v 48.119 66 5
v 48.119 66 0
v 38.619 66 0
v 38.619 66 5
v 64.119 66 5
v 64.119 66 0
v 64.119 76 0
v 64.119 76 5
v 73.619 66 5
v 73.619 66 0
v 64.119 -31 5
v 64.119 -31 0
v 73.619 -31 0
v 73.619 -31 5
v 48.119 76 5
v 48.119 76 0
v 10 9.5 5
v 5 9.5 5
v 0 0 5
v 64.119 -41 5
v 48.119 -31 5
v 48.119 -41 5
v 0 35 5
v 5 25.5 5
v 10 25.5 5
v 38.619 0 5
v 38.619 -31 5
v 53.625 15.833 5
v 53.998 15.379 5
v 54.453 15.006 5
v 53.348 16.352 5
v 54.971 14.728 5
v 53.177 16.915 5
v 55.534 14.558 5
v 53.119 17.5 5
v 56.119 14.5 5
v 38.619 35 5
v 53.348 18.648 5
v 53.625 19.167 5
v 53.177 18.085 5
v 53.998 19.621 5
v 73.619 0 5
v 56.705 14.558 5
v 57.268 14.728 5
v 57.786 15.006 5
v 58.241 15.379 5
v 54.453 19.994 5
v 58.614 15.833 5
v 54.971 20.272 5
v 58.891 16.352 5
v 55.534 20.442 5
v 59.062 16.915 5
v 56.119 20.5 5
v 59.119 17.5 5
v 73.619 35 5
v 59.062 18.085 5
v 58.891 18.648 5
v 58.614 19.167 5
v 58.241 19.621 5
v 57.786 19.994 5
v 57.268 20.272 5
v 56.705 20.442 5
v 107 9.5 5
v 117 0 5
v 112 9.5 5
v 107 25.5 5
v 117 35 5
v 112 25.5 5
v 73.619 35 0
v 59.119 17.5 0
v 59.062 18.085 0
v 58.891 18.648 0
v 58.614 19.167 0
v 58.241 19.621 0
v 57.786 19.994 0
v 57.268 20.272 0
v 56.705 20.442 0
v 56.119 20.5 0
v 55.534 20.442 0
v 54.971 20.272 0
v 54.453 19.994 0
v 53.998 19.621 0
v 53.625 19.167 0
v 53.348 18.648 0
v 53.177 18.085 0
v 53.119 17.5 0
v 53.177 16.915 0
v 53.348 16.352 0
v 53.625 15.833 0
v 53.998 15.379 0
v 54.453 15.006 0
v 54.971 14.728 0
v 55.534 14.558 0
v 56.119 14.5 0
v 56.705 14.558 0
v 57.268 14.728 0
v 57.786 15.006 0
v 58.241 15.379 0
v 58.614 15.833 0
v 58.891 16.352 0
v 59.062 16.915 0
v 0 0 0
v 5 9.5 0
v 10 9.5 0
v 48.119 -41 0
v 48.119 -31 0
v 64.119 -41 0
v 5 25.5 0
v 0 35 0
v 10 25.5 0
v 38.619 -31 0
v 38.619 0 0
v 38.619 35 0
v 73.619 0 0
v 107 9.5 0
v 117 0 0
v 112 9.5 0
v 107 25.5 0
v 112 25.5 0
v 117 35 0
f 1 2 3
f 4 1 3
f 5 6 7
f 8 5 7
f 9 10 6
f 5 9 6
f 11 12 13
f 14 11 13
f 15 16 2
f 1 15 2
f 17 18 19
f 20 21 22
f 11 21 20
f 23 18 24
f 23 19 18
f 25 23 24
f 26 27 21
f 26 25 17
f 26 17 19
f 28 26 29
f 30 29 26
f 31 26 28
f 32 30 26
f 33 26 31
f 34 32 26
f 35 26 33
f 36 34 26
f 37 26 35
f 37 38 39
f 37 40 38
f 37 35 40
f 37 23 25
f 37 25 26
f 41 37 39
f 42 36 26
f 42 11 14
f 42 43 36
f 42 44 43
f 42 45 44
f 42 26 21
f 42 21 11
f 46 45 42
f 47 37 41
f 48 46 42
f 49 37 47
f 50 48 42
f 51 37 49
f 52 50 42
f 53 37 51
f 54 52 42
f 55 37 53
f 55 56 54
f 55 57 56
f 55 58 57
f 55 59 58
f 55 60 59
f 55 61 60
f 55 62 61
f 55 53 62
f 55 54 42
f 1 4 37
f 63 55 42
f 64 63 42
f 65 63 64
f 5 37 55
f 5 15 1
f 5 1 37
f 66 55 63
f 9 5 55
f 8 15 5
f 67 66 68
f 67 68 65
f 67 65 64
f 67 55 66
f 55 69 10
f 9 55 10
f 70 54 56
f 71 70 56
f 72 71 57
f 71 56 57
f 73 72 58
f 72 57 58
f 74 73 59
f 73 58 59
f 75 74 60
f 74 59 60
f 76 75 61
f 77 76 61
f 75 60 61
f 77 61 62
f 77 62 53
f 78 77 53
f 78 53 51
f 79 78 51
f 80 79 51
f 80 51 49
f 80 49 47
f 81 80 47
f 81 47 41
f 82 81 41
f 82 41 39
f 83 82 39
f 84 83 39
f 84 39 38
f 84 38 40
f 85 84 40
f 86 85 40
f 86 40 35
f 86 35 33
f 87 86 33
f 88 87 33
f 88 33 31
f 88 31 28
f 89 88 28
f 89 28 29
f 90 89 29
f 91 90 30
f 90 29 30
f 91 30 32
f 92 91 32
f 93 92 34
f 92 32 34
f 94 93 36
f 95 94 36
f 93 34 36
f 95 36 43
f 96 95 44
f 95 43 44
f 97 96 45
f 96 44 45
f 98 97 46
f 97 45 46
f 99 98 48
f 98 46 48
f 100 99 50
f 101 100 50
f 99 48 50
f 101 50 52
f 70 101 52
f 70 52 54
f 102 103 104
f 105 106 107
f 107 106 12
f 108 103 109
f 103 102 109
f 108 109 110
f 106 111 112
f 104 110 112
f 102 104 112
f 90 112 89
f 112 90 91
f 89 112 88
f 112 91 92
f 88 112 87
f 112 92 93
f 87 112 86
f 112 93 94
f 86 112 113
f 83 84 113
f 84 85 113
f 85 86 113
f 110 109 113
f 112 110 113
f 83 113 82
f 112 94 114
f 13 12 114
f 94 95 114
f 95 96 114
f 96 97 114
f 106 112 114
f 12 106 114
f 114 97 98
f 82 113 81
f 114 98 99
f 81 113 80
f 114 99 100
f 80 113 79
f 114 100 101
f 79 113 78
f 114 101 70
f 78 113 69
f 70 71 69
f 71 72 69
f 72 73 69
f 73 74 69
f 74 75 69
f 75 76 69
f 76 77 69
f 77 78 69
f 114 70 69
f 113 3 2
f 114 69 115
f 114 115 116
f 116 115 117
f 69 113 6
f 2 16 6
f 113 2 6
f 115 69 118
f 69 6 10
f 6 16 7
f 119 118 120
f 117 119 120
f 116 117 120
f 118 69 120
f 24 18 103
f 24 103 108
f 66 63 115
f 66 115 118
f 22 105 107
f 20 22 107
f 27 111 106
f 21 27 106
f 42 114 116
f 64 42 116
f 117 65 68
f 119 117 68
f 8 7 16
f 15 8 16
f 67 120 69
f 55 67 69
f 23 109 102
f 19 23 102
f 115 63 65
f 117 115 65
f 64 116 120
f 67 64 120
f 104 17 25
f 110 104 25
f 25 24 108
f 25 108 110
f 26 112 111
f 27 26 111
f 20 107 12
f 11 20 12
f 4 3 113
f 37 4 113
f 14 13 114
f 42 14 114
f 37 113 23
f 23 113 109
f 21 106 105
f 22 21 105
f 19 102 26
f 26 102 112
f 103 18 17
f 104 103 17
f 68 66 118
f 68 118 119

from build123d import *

# Parameters (mm, degrees)
BOSS_EXTRUDE3_DEPTH = 5
SKETCH2_W           = 5
SKETCH2_H           = 16
CUT_EXTRUDE1_DEPTH  = 140.606590102
SKETCH3_R           = 3
CUT_EXTRUDE2_DEPTH  = 140.606590102


with BuildPart() as part:
    # Sketch1 → Boss-Extrude3 (new body)
    with BuildSketch(Plane.XY):
        Polygon((0, 0), (38.61949762, 0), (38.61949762, -31), (48.11949762, -31), (48.11949762, -41), (64.11949762, -41), (64.11949762, -31), (73.61949762, -31), (73.61949762, 0), (117, 0), (117, 35), (73.61949762, 35), (73.61949762, 66), (64.11949762, 66), (64.11949762, 76), (48.11949762, 76), (48.11949762, 66), (38.61949762, 66), (38.61949762, 35), (0, 35), align=None)
    extrude(amount=BOSS_EXTRUDE3_DEPTH)

    # Sketch2 → Cut-Extrude1 (cut, through all)
    with BuildSketch(Plane.XY.offset(5)):
        with Locations((7.5, 17.5)):
            Rectangle(SKETCH2_W, SKETCH2_H)
        with Locations((109.5, 17.5)):
            Rectangle(SKETCH2_W, SKETCH2_H)
    extrude(amount=-CUT_EXTRUDE1_DEPTH, mode=Mode.SUBTRACT)

    # Sketch3 → Cut-Extrude2 (cut, through all)
    with BuildSketch(Plane.XY.offset(5)):
        with Locations((56.11949762, 17.5)):
            Circle(SKETCH3_R)
    extrude(amount=-CUT_EXTRUDE2_DEPTH, mode=Mode.SUBTRACT)


solid = part.part
